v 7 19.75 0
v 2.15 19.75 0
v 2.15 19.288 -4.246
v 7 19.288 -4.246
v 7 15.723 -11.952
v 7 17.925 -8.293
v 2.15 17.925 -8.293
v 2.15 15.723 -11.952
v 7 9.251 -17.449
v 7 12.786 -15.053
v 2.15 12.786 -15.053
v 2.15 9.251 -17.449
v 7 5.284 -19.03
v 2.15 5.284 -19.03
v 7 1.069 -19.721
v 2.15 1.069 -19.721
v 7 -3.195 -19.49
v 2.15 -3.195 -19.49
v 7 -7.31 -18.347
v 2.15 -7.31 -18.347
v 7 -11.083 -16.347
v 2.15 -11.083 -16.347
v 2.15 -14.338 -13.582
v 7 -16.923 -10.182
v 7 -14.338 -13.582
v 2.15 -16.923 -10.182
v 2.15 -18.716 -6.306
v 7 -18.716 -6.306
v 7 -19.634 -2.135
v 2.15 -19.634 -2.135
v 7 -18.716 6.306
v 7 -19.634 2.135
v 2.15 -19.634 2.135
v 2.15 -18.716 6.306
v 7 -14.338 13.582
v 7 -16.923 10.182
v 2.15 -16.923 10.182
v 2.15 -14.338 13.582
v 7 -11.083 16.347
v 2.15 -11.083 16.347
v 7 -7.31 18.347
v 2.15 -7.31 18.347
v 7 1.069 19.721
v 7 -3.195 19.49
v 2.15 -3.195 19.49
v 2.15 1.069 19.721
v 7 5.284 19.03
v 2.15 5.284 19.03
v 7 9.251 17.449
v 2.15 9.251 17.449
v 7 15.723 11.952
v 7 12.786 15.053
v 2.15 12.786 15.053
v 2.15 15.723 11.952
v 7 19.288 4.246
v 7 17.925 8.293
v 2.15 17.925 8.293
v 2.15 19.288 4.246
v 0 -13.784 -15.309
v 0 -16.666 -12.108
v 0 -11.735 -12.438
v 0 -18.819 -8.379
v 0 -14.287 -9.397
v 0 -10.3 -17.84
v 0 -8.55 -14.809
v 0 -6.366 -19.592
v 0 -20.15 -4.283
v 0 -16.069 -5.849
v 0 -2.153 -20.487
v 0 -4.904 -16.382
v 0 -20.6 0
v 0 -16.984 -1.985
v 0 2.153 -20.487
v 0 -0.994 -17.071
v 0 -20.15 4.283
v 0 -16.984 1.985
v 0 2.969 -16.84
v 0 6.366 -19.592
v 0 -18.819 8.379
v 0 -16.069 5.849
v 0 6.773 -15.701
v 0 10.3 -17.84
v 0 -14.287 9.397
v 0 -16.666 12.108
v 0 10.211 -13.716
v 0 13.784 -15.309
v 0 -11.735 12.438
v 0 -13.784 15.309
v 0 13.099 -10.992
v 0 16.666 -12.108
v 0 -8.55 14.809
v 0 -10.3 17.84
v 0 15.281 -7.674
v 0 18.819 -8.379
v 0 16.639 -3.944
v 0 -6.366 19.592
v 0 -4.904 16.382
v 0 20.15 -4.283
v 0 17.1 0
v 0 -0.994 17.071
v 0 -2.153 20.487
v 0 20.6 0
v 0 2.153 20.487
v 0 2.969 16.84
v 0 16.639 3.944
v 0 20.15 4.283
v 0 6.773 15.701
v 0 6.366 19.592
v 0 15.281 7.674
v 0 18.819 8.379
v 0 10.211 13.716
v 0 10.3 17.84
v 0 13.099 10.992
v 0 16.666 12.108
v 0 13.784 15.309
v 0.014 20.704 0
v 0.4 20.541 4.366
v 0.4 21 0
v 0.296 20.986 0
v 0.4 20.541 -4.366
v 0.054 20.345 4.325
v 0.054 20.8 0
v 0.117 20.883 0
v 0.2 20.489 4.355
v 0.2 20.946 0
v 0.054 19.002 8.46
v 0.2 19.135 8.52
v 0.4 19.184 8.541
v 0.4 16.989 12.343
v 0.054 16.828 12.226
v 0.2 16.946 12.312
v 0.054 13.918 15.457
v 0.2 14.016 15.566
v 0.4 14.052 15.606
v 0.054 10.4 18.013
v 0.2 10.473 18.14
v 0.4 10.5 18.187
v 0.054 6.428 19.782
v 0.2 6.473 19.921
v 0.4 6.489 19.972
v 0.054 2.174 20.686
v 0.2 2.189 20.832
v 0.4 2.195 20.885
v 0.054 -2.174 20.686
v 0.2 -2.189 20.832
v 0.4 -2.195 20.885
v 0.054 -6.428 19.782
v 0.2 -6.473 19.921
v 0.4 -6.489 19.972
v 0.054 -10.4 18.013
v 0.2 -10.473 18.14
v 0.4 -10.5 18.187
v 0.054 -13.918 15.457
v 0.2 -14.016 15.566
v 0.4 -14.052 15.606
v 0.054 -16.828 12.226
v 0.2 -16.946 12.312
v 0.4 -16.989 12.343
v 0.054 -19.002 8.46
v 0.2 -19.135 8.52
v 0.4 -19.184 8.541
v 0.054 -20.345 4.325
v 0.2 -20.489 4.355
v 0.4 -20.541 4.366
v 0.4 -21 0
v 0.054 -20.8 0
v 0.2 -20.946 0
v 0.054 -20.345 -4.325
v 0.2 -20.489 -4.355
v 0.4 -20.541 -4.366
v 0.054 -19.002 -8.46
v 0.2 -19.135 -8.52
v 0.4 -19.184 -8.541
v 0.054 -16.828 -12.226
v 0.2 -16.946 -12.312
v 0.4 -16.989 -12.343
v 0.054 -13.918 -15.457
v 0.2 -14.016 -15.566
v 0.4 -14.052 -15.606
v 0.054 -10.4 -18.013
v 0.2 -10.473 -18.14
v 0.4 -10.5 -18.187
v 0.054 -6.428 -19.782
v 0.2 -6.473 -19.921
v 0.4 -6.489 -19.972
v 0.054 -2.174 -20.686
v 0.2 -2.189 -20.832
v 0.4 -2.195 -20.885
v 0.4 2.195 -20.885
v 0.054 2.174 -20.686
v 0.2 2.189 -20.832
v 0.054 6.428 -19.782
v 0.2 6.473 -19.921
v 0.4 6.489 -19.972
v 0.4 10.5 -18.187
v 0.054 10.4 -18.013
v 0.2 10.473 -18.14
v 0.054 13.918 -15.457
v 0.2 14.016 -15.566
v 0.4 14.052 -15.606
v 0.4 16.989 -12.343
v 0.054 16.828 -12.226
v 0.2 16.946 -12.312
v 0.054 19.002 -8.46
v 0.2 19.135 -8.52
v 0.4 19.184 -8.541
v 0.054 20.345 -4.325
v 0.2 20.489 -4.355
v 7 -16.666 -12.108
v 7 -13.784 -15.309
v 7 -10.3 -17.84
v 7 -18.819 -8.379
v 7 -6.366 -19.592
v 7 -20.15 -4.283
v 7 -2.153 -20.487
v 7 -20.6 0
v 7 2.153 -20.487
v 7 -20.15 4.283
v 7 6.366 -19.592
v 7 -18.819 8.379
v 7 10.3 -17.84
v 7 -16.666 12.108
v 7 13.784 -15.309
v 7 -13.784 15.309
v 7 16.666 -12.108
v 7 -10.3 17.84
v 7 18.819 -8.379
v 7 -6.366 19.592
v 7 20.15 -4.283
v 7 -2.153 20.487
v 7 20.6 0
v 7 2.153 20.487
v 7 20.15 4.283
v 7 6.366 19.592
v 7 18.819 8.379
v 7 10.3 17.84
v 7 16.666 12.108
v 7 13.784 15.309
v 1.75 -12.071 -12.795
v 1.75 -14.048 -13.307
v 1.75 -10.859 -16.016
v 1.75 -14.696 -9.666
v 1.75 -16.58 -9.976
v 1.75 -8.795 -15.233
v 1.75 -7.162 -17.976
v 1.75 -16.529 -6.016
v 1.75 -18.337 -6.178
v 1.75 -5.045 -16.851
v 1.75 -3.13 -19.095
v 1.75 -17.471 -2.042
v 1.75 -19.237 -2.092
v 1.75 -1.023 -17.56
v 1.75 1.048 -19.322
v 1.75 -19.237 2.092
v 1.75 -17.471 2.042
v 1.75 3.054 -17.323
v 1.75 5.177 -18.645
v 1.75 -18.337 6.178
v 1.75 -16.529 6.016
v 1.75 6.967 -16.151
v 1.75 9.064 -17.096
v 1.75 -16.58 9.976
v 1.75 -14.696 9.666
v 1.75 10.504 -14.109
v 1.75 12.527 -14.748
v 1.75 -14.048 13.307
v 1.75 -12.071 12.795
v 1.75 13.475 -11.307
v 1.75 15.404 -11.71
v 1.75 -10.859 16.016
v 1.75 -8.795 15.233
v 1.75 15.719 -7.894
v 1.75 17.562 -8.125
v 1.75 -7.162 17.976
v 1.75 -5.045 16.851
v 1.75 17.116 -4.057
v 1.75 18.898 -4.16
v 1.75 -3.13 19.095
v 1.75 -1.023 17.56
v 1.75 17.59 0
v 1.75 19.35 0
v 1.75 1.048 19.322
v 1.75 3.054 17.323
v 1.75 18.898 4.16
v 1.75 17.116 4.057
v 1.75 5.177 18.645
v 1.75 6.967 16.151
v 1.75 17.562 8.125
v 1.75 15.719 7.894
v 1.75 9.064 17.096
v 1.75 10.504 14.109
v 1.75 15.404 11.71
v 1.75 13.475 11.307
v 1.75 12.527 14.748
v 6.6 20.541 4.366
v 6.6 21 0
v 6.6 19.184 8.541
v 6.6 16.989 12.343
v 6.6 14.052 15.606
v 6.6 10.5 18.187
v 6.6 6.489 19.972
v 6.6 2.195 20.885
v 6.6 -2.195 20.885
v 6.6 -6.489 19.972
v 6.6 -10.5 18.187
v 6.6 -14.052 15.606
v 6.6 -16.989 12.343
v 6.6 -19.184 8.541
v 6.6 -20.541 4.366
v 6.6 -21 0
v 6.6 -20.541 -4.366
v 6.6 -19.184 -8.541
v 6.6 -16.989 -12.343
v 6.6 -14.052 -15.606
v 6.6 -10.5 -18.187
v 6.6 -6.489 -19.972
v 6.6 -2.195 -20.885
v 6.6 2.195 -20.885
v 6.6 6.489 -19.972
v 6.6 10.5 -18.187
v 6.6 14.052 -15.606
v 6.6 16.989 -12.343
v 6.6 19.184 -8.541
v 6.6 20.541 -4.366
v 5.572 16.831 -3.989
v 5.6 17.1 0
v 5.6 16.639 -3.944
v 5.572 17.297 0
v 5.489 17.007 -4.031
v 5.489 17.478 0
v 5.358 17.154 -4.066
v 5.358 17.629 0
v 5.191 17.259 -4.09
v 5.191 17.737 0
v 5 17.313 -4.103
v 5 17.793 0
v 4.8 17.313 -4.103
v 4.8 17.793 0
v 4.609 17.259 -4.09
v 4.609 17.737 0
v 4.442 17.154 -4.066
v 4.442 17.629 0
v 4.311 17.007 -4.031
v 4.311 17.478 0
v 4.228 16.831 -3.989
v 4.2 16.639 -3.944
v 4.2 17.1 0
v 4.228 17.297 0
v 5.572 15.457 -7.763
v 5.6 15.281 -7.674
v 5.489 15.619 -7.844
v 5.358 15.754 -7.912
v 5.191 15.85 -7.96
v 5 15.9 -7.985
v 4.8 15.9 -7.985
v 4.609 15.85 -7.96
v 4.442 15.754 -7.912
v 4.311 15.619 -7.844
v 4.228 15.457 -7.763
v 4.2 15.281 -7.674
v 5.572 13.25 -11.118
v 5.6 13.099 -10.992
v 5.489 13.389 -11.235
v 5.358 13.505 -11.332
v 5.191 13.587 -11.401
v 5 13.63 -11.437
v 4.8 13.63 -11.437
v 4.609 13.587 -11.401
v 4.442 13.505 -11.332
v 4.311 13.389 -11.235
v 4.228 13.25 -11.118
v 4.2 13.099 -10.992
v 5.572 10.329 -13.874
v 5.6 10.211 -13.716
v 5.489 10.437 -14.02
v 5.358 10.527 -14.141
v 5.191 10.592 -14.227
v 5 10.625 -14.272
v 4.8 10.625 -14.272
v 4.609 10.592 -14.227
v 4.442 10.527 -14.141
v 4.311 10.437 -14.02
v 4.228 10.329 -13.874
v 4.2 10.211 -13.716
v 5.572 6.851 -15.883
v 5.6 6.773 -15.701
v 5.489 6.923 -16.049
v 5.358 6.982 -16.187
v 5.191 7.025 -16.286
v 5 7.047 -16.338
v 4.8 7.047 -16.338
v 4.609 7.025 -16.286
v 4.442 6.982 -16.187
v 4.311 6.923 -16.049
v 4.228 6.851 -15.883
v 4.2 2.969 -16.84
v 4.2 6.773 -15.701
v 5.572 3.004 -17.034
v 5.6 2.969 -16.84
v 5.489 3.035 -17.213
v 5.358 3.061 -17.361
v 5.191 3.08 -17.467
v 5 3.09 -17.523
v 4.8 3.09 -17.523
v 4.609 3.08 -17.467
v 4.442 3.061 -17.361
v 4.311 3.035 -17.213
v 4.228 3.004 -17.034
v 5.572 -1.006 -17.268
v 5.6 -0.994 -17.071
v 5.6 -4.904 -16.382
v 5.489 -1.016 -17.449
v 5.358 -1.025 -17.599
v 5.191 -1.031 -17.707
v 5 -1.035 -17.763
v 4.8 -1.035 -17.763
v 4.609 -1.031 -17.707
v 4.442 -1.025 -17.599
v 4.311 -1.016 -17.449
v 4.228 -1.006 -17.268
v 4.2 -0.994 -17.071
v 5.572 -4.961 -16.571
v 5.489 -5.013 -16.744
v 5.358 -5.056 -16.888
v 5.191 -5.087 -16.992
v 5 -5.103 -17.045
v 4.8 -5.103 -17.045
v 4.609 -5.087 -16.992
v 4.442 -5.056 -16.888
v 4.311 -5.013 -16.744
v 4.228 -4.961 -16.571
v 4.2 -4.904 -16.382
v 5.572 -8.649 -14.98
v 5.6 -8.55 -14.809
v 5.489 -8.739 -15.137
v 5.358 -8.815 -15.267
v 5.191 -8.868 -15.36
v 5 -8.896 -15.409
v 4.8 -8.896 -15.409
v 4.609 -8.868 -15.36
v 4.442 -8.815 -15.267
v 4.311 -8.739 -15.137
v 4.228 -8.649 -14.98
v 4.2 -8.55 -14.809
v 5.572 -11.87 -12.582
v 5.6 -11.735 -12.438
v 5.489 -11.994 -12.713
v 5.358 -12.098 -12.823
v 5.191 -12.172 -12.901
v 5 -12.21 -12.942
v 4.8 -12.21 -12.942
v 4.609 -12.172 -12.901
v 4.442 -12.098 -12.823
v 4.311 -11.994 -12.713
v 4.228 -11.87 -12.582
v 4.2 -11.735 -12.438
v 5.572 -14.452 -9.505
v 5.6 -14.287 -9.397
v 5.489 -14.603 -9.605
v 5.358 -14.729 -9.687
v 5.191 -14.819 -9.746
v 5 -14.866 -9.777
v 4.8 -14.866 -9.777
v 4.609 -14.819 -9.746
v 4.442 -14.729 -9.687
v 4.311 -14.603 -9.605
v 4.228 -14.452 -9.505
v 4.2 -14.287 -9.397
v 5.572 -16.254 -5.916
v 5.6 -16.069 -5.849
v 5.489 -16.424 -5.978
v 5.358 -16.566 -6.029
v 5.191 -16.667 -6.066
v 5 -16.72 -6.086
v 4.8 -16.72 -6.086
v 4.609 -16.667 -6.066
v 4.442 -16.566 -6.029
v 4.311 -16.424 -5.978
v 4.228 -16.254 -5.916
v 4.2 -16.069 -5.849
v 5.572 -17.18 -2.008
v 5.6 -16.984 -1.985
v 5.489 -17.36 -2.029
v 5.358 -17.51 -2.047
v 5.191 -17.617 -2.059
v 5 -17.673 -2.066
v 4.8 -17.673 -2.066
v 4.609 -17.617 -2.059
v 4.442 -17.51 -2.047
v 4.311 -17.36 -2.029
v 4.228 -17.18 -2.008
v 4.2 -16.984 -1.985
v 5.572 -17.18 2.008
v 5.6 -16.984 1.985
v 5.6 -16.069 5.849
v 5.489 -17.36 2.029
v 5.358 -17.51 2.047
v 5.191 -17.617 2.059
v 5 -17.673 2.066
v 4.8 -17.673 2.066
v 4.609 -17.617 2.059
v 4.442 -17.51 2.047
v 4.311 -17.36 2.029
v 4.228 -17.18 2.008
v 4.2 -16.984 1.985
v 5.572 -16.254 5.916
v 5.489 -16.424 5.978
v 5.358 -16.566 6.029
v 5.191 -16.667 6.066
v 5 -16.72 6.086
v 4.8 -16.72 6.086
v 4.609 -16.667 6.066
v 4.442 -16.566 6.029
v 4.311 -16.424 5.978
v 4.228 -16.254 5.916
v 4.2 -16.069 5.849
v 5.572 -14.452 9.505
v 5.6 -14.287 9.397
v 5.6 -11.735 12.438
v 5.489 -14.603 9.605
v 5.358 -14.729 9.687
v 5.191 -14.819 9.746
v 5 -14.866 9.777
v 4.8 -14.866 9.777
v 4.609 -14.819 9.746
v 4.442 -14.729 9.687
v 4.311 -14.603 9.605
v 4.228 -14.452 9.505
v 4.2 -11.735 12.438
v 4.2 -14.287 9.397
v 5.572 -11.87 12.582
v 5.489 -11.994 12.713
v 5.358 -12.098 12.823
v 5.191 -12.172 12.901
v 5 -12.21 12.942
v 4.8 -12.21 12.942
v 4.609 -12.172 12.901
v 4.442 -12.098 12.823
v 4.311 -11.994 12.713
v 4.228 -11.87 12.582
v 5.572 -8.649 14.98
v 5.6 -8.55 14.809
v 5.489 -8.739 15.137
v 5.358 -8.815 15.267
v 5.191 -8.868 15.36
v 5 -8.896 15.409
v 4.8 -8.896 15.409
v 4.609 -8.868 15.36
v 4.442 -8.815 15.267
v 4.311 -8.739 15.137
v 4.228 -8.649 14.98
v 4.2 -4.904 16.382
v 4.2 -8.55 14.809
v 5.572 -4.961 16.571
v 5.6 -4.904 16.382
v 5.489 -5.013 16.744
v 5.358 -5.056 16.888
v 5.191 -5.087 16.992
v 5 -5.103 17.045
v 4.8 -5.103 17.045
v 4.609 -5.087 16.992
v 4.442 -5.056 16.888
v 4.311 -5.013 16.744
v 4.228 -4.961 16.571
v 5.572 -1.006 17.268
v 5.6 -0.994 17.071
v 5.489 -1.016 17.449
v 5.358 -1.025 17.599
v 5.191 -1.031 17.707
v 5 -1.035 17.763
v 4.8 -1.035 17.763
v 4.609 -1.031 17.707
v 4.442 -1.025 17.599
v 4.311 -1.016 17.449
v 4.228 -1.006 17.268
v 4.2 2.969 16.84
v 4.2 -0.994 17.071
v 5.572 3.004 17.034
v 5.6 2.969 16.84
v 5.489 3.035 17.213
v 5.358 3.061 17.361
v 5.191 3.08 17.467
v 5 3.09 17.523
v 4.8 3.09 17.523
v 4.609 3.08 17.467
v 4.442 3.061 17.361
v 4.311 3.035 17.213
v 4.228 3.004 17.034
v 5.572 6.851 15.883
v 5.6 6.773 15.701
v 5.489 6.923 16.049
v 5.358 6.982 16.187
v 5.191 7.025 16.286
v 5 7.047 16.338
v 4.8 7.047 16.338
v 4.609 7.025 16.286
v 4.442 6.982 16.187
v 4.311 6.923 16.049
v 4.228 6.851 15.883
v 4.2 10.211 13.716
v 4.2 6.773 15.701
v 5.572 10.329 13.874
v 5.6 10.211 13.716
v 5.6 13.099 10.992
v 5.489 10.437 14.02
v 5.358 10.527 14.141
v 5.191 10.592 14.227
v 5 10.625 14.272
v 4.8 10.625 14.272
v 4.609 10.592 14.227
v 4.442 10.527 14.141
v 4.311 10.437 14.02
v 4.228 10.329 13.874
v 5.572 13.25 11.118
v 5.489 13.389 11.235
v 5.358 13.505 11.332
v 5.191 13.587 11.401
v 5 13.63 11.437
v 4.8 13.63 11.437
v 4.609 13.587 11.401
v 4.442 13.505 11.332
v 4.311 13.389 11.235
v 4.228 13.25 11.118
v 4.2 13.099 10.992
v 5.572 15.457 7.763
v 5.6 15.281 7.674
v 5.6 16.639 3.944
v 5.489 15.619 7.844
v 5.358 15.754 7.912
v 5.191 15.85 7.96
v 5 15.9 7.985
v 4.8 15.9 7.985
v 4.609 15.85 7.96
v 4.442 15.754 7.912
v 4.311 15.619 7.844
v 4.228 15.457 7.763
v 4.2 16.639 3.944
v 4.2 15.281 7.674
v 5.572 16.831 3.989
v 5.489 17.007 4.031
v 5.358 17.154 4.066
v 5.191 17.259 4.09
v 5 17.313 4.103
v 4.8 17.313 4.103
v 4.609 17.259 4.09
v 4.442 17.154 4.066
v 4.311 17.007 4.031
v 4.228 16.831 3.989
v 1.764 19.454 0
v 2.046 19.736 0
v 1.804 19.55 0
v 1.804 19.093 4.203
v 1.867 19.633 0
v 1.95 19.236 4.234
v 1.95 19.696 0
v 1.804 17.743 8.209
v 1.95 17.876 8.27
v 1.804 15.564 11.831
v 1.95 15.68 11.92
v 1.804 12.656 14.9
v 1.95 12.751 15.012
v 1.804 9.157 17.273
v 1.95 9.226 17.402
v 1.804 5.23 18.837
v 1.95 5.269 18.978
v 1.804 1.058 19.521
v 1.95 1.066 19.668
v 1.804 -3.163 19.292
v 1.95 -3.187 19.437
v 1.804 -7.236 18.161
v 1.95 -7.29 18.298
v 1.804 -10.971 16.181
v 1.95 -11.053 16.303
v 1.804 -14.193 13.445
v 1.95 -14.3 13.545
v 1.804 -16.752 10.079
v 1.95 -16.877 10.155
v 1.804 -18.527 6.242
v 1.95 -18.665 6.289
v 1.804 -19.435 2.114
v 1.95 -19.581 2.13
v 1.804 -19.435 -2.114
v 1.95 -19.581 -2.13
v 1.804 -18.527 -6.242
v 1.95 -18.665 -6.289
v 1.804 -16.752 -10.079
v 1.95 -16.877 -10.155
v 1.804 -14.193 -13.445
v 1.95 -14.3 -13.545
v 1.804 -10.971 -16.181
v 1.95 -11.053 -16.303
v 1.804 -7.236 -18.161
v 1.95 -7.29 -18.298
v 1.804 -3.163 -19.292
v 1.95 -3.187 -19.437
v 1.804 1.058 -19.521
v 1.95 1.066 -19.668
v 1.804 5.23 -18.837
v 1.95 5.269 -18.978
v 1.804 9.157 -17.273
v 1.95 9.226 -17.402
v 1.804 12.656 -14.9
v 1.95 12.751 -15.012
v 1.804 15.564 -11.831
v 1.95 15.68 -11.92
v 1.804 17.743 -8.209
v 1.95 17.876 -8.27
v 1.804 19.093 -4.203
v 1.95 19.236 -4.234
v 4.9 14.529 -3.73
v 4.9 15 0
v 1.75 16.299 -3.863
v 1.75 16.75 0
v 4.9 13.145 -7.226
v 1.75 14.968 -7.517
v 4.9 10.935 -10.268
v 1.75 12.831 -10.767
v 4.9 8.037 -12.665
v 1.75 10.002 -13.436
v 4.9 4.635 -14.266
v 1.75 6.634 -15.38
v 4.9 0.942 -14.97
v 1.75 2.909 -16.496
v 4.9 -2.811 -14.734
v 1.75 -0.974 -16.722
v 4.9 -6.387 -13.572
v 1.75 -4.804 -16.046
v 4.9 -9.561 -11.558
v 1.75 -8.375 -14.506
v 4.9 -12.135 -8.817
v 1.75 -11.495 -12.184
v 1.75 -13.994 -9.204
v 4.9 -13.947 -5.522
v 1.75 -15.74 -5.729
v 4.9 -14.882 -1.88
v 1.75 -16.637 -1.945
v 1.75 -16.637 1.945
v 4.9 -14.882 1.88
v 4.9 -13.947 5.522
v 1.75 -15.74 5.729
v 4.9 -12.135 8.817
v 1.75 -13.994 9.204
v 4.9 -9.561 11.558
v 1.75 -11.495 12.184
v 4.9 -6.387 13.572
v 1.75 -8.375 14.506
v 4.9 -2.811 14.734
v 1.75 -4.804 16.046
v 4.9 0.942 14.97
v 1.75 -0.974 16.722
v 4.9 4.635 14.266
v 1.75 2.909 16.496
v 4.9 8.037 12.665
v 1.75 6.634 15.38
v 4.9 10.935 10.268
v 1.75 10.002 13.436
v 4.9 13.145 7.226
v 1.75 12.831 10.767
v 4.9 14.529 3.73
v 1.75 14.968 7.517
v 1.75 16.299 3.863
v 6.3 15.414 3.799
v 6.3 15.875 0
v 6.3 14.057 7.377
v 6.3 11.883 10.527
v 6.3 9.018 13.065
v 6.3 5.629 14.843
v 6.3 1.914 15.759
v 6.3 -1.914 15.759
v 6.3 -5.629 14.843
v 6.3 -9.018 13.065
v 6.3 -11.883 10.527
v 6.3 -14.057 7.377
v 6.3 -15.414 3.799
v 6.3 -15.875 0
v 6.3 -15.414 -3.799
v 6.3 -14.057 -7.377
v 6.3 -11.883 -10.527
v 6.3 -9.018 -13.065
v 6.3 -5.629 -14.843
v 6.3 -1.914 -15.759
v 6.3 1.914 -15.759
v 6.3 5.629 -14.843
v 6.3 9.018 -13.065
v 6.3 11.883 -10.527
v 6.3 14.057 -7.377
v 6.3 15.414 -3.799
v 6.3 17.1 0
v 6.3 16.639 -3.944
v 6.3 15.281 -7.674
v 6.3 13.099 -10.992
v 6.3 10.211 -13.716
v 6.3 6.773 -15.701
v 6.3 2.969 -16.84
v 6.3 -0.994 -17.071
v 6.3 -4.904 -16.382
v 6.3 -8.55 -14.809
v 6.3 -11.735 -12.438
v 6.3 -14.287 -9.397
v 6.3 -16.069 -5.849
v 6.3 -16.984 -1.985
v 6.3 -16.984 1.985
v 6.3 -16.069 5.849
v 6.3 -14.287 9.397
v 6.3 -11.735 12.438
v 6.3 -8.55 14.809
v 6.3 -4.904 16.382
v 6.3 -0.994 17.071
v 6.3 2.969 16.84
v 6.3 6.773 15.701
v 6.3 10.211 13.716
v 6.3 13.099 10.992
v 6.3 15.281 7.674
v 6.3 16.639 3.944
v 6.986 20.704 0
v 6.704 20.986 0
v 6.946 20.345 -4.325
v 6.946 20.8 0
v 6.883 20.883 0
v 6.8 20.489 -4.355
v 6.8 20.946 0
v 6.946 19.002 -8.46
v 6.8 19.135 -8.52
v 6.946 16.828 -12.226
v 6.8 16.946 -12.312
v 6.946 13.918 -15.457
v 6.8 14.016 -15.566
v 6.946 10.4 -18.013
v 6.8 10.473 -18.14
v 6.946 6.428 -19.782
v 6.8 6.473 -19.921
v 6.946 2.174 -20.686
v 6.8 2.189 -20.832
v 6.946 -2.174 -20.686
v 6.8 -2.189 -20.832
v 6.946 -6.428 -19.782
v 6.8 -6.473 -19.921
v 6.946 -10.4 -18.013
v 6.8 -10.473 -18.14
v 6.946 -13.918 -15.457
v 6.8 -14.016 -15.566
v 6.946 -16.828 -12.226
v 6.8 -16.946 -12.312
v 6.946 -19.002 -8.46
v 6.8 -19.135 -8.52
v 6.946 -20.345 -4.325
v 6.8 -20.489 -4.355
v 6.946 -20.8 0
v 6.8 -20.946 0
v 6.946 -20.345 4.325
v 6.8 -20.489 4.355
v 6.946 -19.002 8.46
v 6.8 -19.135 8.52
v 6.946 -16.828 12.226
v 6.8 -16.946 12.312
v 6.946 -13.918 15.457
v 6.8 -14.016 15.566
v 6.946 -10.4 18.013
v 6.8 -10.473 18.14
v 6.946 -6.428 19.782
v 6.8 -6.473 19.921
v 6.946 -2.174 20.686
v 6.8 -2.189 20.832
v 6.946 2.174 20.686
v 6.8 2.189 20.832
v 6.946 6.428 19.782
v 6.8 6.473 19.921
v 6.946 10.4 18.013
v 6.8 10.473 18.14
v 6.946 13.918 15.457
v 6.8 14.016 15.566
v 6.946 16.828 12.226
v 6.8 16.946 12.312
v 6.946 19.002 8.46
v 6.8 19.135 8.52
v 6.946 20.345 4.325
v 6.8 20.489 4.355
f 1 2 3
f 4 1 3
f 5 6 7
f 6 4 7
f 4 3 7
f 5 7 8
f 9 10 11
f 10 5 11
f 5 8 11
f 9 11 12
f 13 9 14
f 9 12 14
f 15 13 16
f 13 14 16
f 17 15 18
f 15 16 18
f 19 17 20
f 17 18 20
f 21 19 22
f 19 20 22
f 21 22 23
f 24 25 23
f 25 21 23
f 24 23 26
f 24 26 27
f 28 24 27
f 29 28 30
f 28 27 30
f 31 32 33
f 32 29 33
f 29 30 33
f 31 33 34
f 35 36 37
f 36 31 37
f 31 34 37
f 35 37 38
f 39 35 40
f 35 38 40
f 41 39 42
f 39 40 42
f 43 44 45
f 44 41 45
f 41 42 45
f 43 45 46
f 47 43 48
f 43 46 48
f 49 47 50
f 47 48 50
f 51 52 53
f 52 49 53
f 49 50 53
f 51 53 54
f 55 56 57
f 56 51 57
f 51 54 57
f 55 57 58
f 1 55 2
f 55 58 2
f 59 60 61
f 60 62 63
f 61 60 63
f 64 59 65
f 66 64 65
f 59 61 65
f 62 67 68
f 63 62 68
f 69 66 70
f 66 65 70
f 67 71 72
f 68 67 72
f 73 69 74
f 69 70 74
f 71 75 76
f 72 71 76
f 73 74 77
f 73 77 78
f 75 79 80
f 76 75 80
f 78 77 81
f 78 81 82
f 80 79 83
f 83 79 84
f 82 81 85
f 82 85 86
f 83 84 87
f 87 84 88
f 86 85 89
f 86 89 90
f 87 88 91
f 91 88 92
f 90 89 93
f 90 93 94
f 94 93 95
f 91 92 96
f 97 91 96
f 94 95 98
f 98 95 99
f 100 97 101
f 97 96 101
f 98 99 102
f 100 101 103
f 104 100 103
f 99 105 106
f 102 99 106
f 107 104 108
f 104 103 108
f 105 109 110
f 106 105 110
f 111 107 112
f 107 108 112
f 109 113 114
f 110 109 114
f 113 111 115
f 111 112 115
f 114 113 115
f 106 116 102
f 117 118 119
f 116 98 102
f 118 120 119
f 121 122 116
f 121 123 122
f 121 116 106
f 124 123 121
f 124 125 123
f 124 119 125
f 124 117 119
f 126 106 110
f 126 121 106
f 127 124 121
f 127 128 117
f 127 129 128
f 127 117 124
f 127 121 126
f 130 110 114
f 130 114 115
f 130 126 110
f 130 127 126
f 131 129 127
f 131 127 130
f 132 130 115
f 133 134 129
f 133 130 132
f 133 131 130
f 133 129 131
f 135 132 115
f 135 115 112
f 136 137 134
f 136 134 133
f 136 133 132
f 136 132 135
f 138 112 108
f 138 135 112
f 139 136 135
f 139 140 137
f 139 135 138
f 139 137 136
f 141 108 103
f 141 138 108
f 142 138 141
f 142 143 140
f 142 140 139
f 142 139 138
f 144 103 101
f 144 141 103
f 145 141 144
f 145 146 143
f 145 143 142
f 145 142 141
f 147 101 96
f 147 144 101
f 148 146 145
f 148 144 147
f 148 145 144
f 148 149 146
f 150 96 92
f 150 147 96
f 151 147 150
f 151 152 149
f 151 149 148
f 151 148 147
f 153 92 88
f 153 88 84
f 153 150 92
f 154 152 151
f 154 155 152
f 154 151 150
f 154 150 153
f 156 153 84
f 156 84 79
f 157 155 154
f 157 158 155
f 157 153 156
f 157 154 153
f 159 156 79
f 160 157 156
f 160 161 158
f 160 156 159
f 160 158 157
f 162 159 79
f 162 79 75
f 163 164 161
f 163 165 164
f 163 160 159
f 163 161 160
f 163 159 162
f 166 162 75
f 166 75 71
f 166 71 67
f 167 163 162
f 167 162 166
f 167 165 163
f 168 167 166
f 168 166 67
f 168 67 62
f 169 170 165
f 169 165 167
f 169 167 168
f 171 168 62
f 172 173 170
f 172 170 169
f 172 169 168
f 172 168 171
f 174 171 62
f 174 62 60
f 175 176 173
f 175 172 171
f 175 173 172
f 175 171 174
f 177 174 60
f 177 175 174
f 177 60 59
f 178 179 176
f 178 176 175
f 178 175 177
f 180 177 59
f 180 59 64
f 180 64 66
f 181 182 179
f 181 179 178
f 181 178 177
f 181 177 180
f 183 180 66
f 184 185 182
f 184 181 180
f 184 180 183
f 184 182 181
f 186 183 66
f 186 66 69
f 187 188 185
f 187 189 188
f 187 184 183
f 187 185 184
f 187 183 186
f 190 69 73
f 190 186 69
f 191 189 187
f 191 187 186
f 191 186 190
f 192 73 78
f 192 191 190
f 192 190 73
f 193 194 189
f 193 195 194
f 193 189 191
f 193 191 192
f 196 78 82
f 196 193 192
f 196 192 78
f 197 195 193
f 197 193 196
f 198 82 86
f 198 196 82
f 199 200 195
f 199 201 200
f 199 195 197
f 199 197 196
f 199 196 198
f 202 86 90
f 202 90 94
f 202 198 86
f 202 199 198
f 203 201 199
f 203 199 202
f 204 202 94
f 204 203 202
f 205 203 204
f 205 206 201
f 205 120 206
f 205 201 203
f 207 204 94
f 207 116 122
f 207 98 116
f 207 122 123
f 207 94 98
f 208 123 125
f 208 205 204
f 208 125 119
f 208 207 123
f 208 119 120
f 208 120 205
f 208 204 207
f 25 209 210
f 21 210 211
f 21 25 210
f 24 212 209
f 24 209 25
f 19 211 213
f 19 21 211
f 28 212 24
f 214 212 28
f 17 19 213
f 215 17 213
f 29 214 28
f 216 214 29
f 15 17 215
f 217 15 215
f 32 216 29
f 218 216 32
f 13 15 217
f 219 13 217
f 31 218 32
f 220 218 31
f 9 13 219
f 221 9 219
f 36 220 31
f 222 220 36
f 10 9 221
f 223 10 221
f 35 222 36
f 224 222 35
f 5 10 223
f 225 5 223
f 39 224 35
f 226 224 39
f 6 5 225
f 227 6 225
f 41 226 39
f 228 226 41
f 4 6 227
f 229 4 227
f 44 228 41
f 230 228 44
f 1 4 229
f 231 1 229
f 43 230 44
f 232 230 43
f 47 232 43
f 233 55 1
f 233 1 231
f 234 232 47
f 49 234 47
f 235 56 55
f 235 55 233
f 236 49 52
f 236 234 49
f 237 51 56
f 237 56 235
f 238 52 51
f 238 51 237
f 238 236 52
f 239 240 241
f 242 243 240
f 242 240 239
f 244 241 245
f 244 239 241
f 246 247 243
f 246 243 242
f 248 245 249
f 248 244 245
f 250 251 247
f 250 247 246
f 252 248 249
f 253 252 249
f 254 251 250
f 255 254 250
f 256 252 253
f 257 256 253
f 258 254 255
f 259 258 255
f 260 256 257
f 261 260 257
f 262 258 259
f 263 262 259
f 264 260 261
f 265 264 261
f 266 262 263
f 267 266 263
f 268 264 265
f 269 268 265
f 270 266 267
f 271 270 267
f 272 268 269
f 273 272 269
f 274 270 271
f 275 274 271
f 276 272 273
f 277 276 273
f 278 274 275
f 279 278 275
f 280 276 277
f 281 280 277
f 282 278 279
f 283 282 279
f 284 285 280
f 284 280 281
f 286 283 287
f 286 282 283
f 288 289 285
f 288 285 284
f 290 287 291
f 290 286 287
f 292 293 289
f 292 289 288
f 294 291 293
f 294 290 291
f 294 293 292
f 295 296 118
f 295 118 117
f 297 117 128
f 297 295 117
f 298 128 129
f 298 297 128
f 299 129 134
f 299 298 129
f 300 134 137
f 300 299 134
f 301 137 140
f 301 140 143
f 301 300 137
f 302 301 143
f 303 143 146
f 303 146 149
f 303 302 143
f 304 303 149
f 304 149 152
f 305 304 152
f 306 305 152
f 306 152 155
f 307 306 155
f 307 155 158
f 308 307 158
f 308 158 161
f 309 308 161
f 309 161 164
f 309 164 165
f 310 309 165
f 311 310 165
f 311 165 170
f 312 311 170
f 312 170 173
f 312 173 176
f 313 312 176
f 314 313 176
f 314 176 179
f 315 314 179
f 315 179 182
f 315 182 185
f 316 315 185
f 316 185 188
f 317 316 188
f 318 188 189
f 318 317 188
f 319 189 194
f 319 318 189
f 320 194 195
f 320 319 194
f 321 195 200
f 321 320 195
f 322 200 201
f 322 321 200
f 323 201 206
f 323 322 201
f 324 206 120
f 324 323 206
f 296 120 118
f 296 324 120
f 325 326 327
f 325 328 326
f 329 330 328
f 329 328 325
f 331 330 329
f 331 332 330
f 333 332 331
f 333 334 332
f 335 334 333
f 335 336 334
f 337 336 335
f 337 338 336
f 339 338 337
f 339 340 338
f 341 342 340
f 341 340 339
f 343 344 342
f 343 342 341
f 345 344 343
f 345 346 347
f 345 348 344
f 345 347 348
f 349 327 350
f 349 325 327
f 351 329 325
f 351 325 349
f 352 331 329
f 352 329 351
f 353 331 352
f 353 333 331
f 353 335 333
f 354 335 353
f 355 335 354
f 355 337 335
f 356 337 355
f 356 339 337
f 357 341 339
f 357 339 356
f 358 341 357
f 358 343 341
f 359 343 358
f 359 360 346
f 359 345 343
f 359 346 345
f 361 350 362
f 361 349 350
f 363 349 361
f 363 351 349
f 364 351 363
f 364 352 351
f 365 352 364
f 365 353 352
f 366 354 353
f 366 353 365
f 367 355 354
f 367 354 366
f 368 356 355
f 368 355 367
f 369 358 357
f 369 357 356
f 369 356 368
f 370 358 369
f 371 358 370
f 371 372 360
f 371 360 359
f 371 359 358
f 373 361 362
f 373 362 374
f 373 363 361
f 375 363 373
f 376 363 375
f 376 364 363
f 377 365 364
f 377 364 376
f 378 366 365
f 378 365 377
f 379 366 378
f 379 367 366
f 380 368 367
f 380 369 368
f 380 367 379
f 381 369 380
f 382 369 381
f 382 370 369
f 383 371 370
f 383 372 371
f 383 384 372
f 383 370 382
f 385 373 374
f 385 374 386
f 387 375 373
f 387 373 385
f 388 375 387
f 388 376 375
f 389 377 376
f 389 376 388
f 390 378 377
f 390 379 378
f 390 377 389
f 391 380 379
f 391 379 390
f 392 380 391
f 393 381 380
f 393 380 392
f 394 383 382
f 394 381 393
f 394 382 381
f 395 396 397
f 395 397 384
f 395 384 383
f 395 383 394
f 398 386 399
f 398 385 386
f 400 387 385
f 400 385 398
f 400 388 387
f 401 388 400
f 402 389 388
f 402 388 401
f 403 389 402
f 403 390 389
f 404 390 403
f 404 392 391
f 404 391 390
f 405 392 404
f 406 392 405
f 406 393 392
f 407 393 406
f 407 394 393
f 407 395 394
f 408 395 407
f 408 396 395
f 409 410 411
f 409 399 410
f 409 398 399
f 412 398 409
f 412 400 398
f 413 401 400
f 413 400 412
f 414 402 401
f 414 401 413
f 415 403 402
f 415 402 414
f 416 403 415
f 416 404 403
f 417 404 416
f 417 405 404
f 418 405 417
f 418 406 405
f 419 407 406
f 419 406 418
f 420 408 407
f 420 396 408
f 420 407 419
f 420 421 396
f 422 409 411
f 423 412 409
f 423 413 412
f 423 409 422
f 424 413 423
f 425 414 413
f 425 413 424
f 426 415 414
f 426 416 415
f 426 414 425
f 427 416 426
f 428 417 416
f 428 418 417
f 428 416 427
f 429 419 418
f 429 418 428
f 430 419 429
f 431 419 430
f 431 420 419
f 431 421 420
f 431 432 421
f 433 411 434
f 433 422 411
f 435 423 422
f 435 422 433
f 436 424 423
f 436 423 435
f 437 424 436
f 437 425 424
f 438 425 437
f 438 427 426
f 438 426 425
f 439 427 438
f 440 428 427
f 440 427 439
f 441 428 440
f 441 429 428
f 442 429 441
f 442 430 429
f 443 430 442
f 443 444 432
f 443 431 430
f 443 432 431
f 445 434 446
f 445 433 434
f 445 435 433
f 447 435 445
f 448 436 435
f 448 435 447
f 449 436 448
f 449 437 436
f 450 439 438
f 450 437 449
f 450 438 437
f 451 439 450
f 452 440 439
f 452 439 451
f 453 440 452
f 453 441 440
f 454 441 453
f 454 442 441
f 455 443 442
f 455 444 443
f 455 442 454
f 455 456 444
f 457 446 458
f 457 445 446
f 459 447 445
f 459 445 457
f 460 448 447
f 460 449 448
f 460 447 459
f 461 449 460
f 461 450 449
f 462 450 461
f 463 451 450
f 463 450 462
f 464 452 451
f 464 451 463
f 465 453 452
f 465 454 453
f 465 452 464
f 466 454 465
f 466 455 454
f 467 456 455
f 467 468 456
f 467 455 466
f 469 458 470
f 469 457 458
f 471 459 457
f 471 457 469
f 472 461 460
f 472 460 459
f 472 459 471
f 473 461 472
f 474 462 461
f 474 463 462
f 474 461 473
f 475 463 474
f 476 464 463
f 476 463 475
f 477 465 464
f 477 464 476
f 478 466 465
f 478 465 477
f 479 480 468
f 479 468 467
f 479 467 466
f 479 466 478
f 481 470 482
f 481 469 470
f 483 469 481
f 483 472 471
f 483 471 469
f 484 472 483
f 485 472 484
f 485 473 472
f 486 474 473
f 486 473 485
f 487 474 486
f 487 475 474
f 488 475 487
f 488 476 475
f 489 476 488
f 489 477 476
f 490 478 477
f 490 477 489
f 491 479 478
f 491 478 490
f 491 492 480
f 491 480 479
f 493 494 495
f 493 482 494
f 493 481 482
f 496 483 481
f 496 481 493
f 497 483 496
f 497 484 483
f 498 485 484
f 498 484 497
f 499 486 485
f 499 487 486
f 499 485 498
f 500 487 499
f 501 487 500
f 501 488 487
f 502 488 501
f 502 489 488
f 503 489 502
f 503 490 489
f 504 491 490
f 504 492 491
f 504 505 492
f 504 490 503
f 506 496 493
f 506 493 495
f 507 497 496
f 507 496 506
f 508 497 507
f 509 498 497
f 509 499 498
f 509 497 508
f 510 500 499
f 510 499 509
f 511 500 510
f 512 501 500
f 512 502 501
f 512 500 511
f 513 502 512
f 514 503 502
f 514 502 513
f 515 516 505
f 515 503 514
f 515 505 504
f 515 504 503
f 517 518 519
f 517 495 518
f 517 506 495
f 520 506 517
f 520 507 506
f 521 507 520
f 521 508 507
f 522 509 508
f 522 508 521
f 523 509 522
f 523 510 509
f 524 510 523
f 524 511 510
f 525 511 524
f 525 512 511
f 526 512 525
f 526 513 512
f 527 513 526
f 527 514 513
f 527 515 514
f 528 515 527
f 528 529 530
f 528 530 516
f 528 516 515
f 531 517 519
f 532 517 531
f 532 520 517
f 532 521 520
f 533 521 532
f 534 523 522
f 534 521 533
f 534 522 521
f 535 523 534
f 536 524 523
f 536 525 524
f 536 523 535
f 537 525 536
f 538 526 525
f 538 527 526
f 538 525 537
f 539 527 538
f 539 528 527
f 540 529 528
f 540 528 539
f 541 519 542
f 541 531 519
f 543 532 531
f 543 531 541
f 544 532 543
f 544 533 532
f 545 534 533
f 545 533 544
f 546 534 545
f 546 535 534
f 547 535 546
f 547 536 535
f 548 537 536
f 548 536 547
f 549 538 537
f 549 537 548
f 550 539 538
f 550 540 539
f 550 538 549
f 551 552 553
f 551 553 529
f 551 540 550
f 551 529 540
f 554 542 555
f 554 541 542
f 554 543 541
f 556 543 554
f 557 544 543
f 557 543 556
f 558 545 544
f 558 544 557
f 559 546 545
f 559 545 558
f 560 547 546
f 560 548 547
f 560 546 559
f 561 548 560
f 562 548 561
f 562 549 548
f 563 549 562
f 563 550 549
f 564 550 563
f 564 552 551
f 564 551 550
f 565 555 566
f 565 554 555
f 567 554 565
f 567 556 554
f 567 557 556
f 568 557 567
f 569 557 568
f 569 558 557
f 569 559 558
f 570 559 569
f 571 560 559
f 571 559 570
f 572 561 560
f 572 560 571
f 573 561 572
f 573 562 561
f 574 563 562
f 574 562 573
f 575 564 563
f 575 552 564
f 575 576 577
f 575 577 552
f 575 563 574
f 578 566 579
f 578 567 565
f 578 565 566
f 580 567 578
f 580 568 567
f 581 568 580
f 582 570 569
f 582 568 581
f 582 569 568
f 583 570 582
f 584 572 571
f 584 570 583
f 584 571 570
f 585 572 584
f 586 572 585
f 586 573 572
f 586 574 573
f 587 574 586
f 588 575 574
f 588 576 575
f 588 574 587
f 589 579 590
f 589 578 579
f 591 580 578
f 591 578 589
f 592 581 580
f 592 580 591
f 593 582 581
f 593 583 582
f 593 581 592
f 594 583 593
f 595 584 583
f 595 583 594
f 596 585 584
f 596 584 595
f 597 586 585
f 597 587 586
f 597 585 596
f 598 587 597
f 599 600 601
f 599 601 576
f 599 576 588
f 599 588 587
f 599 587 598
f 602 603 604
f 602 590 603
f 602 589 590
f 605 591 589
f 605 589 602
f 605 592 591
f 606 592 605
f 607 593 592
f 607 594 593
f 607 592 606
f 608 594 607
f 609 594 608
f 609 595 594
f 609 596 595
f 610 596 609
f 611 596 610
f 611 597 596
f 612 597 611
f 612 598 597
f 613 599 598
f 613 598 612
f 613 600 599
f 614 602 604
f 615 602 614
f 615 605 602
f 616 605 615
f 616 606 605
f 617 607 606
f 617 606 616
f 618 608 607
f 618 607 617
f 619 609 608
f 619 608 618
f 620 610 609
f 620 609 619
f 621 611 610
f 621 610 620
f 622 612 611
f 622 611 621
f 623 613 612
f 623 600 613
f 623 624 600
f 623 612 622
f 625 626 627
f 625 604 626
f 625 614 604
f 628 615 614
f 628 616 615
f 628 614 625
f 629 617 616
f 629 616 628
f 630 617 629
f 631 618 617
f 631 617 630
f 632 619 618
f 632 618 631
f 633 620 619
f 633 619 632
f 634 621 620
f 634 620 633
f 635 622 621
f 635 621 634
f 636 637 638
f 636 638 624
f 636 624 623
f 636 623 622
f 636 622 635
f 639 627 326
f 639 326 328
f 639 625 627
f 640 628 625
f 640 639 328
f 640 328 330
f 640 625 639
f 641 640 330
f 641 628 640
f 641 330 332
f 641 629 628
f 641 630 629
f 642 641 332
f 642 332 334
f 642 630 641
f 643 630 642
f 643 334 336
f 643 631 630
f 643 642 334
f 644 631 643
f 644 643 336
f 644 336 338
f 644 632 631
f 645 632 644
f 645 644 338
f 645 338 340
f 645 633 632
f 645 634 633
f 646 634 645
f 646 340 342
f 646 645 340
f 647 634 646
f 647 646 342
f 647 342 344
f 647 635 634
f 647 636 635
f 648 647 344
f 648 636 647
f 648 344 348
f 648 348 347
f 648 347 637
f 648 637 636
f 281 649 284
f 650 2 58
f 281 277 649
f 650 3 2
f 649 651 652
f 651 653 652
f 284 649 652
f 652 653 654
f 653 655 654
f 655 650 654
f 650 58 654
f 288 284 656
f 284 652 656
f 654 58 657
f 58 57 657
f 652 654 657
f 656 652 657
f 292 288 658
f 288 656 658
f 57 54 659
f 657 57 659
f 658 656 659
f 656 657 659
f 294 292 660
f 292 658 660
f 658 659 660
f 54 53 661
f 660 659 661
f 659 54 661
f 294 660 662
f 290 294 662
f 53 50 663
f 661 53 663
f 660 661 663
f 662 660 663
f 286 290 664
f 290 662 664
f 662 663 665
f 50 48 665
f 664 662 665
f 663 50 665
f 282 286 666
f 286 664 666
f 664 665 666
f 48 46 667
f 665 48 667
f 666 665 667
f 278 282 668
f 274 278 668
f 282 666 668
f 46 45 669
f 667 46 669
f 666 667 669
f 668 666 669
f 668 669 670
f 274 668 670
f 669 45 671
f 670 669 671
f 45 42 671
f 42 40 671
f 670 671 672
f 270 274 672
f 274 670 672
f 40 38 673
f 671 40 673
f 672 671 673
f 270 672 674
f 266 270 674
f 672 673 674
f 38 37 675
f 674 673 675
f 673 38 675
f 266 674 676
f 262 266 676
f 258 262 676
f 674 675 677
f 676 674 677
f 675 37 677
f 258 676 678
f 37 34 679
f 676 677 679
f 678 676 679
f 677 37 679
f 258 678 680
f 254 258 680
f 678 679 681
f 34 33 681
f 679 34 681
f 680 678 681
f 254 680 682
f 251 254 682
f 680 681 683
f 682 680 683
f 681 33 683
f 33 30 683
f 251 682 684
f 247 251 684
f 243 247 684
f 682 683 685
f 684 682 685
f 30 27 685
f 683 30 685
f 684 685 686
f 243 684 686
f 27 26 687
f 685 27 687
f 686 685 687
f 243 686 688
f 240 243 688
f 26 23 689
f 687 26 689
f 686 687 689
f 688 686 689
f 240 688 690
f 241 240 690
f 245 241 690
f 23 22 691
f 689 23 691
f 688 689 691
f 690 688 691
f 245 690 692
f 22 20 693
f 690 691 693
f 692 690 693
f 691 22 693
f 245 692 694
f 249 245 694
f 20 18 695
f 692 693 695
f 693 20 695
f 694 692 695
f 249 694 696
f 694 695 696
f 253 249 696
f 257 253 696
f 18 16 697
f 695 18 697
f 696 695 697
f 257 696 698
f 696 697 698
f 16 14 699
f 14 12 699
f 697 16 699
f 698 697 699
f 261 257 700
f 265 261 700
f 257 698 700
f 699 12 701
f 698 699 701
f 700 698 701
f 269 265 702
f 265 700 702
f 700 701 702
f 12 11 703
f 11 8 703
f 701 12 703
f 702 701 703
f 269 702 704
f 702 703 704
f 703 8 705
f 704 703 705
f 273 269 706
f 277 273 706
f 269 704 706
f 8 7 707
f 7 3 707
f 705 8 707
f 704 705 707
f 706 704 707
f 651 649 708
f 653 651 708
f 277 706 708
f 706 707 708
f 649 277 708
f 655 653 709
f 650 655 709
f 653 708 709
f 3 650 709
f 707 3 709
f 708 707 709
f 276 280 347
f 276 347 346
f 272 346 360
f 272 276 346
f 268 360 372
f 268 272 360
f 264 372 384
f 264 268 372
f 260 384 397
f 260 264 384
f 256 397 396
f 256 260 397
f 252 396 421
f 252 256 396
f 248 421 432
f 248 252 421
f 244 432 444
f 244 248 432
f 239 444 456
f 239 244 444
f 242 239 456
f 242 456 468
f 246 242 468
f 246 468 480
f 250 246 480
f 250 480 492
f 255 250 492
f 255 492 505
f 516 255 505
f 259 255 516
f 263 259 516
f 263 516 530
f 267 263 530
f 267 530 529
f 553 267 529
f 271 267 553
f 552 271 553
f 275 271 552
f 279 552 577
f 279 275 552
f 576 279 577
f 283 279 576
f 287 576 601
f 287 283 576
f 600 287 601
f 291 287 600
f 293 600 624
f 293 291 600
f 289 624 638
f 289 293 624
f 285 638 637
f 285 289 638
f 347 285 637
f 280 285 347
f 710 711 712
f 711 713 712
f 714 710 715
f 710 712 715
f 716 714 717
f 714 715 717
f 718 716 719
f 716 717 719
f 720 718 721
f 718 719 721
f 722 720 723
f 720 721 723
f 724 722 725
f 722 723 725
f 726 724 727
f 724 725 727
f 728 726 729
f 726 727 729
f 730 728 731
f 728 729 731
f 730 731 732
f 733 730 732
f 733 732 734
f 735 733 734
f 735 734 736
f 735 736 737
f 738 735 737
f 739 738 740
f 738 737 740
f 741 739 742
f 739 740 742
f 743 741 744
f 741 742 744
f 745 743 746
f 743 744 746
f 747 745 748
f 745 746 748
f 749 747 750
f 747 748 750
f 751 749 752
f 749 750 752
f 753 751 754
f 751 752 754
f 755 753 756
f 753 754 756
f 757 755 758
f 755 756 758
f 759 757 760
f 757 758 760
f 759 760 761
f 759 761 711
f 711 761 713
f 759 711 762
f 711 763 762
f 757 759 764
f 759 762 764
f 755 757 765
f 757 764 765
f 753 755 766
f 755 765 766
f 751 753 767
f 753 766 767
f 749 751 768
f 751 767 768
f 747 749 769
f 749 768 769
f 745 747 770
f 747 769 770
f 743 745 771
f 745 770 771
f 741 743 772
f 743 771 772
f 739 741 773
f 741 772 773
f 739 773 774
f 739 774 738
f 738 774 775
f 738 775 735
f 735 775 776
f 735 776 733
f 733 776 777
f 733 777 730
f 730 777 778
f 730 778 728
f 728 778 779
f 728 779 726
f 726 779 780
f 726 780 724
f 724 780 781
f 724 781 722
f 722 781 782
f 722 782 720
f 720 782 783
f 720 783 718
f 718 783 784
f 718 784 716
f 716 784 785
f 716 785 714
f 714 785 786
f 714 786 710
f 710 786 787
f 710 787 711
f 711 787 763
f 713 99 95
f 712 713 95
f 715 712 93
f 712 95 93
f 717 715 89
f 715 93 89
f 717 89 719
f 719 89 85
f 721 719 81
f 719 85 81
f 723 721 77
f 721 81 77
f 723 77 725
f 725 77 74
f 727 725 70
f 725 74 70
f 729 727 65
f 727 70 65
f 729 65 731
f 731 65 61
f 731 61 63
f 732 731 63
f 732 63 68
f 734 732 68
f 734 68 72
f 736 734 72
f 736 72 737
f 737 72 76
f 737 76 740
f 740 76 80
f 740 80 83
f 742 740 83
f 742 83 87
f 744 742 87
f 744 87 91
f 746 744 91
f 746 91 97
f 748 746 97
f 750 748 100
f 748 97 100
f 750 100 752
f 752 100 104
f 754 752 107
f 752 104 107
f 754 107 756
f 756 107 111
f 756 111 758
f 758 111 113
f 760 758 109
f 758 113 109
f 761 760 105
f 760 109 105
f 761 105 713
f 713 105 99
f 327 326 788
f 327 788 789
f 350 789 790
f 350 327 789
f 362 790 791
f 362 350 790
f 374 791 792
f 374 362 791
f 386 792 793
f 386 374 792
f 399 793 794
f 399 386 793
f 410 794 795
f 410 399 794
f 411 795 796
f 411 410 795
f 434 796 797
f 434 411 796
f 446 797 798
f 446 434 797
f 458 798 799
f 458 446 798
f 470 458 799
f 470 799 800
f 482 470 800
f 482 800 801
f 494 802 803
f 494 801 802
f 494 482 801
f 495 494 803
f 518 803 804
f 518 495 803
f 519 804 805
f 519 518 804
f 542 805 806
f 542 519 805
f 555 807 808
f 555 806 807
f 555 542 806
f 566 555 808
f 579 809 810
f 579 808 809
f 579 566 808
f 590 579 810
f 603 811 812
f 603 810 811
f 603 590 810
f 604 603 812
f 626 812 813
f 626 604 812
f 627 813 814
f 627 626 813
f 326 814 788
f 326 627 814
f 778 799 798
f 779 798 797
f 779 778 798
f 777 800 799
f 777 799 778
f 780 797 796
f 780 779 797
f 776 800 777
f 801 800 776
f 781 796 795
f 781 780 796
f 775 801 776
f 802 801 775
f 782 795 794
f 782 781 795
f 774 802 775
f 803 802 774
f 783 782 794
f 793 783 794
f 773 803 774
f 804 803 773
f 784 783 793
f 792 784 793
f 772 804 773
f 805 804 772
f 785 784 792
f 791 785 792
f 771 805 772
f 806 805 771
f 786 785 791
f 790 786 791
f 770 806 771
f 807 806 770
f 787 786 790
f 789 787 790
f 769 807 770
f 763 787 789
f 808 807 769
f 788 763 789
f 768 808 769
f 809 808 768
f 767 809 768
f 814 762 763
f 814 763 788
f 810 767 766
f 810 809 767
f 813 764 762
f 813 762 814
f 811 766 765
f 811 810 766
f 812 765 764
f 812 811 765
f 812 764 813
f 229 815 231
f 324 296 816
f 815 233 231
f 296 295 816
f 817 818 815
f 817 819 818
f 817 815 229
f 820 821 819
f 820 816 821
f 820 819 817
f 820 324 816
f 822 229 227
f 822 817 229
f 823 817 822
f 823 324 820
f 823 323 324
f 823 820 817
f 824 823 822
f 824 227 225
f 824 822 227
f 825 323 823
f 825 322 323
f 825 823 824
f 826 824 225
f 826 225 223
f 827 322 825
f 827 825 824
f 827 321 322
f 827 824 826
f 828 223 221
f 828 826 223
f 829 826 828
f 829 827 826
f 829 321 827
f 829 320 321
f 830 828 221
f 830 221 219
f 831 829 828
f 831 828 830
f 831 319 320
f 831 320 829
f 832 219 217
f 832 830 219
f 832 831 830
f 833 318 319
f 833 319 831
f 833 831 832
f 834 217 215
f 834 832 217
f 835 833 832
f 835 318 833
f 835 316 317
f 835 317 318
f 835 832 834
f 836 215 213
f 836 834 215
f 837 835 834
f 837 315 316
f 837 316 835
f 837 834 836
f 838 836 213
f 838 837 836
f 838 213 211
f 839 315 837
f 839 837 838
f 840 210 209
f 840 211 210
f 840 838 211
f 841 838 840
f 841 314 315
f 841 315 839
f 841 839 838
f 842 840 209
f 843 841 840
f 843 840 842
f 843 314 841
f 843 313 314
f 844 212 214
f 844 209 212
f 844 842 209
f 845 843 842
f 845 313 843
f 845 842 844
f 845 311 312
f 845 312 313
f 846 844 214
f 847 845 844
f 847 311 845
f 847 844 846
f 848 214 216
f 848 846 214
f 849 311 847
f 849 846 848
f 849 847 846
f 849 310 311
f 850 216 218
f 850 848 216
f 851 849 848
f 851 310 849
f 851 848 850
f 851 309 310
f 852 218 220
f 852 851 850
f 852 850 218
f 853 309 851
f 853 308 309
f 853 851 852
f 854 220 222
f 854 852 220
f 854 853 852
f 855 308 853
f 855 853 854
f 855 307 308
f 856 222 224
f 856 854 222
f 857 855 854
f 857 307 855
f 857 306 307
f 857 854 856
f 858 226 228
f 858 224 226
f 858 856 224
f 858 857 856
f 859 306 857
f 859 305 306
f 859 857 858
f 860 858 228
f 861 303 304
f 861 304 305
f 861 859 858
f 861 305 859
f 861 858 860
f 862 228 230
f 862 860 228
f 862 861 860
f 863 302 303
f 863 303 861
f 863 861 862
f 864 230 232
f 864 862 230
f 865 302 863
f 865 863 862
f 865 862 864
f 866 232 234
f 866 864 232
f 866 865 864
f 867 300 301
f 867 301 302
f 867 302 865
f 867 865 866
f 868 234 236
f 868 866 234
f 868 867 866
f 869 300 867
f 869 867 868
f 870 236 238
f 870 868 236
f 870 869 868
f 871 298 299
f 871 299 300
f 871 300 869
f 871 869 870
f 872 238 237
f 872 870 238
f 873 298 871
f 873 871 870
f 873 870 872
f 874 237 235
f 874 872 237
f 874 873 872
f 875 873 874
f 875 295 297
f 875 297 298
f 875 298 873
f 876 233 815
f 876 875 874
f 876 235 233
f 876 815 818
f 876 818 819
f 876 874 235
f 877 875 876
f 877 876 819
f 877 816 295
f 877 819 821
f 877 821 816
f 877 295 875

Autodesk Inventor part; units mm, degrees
ref_plane "YZ Plane" through (0, 0, 0) normal (1, 0, 0) x (0, 1, 0)
ref_plane "XZ Plane" through (0, 0, 0) normal (0, 1, 0) x (-1, 0, 0)
ref_plane "XY Plane" through (0, 0, 0) normal (0, 0, 1) x (1, 0, 0)
sketch "Эскиз1" plane through (0, 0, 0) normal (0, 0, 1) x (1, 0, 0)
  circle A0 centre (4.9, 17.1) radius 0.455
  circle A1 centre (4.9, 17.1) radius 0.7
  line L0 (6.3, 15.875) -> (6.3, 17.1)
  line L1 (0, 21) -> (7, 21)
  line L2 (7, 21) -> (7, 19.75)
  line L3 (7, 19.75) -> (1.75, 19.75)
  line L4 (0, 0) -> (9.5856, 0)
  line L5 (0, 21) -> (0, 17.1)
  line L6 (0, 17.1) -> (1.75, 16.75)
  line L7 (1.75, 16.75) -> (4.9, 15)
  line L8 (4.9, 15) -> (6.3, 15.875)
  line L9 (4.9, 15) -> (0, 15) construction
  line L10 (0, 18) -> (0, -3) projected
  line L11 (-1.9171, 0) -> (11.5027, 0) projected
  line L12 (4.2, 17.1) -> (1.75, 17.59)
  line L13 (1.75, 17.59) -> (1.75, 19.75)
  line L14 (6.3, 17.1) -> (5.6, 17.1)
  dimension "d0" = 42
  dimension "d1" = 31.75
  dimension "d2" = 1.25
  dimension "d3" = 0.91
  dimension "d4" = 1.4
  dimension "d5" = 30
  dimension "d6" = 33.5
  dimension "d7" = 34.2
  dimension "d8" = 4.9
  dimension "d9" = 6.3
  dimension "d10" = 7
  dimension "d12" = 1.75
revolve "Базовый элемент" add sketch "Эскиз1" angle 360 about axis through (0, 0, 0) along (1, 0, 0) contours L14 L0 L8 L7 L6 L5 L1 L2 L3 L13 L12 A1
revolve "Пружинные1" add sketch "Эскиз1" angle 360 about axis through (0, 0, 0) along (1, 0, 0) contours A0 | A1
fillet "Сопряжение1" radius 0.4 3 edges at (7, -21, 0) (1.75, -19.75, 0) (0, -21, 0)
equation "\"d0\" = SD2"
equation "\"d1\" = ABDM"
equation "\"d3\" = SPDI"
equation "\"d4\" = SPDA"
equation "\"d5\" = NND"
equation "\"d6\" = TKDM"
equation "\"d7\" = HLDM"
equation "\"d8\" = SPDST"
equation "\"d9\" = SDI"
equation "\"d10\" = SWDT"
equation "\"d12\" = SD"
equation "\"d11\" = RR"
equation "\"SD2\" = 42"
equation "\"SWDT\" = 7"
equation "\"RR\" = 0.4"
equation "\"SD\" = 1.75"
equation "\"NND\" = 30"
equation "\"SPDA\" = 1.4"
equation "\"SPDI\" = 0.91"
equation "\"TKDM\" = 33.5"
equation "\"HLDM\" = 34.2"
equation "\"ABDM\" = 31.75"
equation "\"SDI\" = 6.3"
equation "\"SPDST\" = 4.9"
equation "\"LAB\" = 0.35"
properties part number "Манжет 1-30x42x7 ГОСТ 8752-79" material "Резина"
